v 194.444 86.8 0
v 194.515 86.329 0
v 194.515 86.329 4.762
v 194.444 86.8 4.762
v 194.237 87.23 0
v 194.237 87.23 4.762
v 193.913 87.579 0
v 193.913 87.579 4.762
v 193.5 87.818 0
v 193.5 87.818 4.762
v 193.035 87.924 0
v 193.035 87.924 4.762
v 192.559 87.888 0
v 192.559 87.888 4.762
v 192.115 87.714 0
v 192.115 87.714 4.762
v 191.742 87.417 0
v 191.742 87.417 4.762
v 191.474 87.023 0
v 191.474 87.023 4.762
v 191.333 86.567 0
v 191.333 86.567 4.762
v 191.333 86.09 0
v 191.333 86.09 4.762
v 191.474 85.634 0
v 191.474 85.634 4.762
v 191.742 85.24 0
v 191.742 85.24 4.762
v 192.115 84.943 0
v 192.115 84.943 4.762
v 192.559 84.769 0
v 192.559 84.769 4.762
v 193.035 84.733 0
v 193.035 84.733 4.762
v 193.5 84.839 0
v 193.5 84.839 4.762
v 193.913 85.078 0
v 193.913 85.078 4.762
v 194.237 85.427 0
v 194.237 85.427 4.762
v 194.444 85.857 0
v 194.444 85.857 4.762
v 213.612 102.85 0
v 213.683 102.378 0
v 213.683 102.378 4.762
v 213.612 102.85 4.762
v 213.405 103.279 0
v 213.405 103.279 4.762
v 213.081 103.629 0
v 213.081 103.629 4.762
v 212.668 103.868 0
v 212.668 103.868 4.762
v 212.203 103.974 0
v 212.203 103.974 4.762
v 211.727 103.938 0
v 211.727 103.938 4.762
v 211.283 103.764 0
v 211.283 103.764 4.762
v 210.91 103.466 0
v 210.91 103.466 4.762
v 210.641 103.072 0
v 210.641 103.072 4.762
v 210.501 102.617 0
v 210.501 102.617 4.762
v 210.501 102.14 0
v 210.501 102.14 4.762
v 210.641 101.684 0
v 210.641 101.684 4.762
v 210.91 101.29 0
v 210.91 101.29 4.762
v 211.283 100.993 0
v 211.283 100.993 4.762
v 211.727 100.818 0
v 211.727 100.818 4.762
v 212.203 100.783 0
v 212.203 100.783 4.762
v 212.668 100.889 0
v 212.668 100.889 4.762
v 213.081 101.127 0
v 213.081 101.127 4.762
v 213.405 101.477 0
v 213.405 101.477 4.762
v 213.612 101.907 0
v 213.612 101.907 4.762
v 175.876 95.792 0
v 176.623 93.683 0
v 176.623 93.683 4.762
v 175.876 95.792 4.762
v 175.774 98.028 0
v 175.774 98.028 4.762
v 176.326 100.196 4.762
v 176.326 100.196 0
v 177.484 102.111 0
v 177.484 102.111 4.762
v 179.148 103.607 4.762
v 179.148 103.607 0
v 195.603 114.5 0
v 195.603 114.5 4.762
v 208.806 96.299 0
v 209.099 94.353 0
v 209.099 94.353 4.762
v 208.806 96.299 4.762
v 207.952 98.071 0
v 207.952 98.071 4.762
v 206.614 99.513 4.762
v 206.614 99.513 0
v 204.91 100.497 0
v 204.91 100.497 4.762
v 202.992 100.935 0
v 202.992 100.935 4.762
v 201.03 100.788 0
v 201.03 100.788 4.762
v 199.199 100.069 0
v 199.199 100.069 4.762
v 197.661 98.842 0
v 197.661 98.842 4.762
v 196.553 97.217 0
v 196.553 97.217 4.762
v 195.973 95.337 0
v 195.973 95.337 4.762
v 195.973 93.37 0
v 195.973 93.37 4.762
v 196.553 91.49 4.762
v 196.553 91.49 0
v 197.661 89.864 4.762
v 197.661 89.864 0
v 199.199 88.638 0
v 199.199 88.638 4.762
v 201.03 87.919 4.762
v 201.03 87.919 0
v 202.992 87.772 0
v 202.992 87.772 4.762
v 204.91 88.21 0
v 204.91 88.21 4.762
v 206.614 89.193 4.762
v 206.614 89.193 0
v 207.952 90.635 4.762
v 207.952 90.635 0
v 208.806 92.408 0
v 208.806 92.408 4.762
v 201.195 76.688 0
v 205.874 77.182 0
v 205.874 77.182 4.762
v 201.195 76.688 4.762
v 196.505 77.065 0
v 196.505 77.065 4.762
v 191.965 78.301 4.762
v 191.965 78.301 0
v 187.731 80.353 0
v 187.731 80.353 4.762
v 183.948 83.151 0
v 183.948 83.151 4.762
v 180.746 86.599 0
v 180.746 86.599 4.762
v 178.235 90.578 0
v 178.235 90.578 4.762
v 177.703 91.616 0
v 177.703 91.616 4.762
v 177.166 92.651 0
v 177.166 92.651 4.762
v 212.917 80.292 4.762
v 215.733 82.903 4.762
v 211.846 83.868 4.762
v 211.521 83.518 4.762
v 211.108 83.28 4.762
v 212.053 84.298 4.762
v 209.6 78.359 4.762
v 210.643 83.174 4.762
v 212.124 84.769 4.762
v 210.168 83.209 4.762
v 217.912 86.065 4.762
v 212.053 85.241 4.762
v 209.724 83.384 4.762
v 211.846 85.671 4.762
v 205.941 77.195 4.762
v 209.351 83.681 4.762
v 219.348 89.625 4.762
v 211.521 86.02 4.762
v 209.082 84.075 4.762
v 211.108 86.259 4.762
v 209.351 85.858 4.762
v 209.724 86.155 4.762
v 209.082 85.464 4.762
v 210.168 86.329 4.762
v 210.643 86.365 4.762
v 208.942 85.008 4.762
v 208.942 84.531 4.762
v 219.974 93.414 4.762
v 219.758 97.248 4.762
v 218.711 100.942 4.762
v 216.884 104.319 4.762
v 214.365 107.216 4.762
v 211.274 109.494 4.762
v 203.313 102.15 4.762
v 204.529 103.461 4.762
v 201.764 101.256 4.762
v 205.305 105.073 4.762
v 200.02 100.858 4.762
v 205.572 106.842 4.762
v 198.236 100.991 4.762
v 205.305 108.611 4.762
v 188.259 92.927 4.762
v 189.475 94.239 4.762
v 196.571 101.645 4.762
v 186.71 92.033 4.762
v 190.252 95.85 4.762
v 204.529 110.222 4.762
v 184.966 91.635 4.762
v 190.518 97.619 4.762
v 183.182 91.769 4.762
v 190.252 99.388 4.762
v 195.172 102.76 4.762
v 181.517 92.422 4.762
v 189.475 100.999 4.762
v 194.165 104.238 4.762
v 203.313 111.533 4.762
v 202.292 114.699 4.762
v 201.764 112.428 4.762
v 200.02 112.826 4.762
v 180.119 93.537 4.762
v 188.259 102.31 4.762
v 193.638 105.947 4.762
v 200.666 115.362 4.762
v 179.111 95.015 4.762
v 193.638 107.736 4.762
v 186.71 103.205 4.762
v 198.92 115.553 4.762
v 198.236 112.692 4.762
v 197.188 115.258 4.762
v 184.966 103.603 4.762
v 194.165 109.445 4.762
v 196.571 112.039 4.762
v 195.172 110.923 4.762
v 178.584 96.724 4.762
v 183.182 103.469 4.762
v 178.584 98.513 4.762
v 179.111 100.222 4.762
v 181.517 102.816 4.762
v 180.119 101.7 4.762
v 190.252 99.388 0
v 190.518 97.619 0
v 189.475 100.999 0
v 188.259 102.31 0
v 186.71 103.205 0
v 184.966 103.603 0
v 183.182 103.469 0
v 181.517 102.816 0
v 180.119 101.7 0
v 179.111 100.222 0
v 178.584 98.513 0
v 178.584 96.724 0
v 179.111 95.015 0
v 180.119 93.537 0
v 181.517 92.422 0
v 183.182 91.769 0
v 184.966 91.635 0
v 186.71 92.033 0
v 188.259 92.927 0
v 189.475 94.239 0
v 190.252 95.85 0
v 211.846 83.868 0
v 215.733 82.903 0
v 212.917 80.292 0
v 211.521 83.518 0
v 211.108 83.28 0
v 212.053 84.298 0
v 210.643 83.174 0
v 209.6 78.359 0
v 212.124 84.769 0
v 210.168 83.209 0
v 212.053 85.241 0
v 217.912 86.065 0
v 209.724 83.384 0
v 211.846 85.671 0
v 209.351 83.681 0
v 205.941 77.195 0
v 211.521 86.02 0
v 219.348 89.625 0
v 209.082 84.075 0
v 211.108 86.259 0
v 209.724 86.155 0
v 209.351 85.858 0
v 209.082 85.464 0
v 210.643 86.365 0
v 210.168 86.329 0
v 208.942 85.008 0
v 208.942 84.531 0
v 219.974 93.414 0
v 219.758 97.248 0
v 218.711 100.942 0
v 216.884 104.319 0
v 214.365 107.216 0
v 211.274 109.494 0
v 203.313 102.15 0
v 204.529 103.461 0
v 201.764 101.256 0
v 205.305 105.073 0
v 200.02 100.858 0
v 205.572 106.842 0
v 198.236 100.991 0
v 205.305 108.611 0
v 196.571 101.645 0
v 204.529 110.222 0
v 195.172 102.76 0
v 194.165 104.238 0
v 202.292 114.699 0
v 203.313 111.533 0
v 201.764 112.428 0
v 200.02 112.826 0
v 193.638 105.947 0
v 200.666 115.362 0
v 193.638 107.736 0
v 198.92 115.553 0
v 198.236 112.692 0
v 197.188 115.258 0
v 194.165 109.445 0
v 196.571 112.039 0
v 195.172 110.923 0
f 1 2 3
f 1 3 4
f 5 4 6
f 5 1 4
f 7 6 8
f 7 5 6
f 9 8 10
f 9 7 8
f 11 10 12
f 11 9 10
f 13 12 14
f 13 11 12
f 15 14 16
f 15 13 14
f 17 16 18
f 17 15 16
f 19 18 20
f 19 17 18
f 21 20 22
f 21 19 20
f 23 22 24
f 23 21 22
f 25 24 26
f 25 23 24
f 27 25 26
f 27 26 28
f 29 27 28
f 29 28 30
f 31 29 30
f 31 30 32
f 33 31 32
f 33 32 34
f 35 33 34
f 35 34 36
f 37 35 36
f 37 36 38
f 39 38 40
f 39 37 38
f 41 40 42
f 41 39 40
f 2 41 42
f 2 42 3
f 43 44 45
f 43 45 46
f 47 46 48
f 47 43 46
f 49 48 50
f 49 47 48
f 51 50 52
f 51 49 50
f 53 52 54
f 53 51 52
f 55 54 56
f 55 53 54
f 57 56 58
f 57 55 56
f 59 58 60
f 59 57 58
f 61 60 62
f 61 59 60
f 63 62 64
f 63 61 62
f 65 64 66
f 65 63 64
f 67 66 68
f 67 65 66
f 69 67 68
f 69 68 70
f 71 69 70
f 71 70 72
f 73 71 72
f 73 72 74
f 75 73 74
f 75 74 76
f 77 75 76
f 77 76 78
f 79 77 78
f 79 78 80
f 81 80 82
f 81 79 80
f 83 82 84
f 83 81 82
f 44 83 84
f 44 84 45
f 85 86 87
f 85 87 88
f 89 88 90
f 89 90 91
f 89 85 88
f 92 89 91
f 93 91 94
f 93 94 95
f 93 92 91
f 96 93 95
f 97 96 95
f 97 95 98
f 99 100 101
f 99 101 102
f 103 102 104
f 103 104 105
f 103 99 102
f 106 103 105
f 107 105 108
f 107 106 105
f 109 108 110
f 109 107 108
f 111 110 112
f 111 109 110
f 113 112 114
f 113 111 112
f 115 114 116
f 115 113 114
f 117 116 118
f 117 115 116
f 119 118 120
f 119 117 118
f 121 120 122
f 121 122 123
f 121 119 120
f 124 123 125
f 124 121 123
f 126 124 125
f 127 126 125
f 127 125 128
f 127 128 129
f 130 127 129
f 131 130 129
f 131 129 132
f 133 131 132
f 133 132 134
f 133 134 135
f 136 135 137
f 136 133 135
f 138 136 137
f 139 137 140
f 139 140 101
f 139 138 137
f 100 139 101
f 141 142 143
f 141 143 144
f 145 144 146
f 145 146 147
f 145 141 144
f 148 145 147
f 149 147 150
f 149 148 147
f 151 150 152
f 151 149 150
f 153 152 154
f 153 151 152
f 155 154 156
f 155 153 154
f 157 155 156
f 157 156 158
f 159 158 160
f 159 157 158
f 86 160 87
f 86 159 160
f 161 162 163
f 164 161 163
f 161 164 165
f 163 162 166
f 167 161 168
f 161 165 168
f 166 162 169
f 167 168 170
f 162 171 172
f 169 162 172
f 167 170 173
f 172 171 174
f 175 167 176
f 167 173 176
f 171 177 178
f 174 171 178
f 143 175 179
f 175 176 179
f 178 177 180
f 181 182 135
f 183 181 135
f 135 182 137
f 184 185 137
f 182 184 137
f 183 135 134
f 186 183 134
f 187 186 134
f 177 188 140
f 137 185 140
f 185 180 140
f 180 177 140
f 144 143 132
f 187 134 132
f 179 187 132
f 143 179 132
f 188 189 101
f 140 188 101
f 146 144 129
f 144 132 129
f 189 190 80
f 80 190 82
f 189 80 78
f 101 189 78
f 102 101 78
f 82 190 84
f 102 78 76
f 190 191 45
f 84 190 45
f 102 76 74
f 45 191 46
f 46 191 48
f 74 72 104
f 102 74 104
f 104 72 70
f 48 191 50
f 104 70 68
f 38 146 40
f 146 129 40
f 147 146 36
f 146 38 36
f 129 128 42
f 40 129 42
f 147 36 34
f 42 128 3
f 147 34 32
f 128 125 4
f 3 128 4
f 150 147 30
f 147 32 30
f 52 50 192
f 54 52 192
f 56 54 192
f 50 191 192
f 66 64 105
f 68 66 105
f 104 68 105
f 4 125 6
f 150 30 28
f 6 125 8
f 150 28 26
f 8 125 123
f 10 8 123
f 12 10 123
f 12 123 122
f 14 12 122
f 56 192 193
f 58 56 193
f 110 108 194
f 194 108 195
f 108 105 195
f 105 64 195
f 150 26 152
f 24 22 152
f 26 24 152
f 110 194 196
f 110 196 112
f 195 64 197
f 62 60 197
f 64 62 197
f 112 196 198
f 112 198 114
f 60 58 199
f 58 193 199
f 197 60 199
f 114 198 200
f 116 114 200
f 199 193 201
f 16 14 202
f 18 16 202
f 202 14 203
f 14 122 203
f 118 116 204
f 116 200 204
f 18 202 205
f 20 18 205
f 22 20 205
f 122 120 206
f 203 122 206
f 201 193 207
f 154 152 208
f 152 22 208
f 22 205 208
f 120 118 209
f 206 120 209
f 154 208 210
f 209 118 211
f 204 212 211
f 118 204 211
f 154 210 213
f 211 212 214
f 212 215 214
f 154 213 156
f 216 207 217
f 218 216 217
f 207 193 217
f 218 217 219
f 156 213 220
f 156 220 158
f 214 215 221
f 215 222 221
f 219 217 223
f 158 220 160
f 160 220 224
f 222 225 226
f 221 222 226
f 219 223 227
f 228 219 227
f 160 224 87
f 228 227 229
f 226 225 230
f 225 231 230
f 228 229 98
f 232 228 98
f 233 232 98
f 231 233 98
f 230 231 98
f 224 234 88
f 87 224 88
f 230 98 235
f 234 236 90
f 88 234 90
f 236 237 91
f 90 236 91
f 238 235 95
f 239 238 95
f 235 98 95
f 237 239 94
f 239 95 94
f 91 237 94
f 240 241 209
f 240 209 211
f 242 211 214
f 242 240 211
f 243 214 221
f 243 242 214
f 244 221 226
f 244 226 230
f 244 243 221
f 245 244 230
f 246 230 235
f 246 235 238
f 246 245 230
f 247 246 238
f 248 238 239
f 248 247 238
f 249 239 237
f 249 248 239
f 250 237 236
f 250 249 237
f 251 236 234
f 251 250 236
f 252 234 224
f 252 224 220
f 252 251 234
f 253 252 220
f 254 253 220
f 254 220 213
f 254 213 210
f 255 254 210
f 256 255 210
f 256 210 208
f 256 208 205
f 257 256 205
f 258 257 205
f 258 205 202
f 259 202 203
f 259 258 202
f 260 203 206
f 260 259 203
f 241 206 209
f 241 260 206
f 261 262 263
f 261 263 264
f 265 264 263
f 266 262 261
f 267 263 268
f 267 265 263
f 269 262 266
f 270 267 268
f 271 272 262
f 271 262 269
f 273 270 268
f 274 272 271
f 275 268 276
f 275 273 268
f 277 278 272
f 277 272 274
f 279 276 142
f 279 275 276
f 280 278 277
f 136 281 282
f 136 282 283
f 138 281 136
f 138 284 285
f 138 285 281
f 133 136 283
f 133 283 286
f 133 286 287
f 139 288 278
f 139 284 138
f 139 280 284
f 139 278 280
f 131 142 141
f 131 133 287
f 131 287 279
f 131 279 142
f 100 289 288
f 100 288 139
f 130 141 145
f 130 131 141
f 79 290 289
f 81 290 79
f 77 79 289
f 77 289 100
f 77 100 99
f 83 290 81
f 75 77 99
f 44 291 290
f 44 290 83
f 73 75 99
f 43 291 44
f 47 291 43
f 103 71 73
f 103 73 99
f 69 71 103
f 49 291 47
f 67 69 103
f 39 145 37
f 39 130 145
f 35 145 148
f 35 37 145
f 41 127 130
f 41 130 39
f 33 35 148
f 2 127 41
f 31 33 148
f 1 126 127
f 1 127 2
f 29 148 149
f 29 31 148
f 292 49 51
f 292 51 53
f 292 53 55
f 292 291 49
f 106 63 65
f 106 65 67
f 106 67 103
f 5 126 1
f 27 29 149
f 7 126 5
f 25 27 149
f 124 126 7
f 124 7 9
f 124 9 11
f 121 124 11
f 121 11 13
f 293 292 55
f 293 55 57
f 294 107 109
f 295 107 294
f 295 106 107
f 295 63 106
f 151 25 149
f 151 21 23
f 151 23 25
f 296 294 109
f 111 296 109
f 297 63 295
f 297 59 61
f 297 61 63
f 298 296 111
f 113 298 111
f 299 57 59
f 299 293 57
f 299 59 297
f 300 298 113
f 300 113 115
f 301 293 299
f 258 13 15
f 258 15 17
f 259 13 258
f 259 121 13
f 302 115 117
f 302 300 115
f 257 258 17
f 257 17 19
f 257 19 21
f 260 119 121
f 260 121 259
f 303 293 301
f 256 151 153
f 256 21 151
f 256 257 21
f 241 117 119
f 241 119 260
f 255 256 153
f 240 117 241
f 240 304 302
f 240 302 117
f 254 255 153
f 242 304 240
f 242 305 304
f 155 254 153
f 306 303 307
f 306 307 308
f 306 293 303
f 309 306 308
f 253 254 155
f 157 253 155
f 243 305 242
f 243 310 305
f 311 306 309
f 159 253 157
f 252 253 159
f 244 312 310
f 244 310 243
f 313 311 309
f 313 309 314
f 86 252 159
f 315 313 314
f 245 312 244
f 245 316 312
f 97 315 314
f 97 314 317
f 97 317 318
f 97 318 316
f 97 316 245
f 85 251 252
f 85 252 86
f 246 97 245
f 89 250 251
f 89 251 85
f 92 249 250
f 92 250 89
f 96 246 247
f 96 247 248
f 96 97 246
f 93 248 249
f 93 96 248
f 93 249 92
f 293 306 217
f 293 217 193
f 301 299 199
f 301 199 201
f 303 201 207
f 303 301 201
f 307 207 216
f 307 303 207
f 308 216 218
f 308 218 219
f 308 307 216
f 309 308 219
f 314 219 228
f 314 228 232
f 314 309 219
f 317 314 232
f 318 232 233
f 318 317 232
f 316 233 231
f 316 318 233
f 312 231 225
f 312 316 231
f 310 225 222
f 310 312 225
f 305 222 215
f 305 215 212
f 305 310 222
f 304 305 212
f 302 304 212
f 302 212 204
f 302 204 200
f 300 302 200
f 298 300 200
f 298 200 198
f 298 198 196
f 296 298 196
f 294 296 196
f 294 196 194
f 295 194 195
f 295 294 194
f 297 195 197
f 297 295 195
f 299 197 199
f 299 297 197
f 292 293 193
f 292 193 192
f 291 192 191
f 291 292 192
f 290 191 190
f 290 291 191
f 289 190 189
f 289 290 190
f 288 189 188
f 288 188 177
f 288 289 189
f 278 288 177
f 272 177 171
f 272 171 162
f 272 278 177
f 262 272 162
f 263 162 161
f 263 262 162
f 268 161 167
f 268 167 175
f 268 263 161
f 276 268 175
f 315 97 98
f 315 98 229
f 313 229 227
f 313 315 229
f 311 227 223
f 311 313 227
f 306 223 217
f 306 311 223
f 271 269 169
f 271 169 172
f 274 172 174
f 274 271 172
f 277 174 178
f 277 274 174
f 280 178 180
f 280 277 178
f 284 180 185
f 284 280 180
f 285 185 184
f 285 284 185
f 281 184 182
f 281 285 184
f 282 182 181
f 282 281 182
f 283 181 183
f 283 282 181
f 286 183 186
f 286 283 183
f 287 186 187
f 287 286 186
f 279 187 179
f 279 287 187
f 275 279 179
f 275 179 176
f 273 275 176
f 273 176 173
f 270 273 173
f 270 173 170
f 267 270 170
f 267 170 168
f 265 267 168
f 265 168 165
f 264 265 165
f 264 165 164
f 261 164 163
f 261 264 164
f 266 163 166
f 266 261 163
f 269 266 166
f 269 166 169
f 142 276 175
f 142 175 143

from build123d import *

# Parameters (mm, degrees)
SKETCH1_R           = 6.00075
SKETCH1_R_2         = 1.6
SKETCH1_R_3         = 6.6
BOSS_EXTRUDE1_DEPTH = 4.7625


with BuildPart() as part:
    # Sketch1 → Boss-Extrude1 (new body)
    with BuildSketch(Plane.XY):
        with BuildLine():
            Line((179.148086511, 103.607144631), (195.603327806, 114.500302414))
            ThreePointArc((195.603327806, 114.500302414), (198.919543637, 115.552562907), (202.292483355, 114.699440851))
            Line((202.292483355, 114.699440851), (211.27381454, 109.494480567))
            ThreePointArc((211.27381454, 109.494480567), (219.765287832, 91.502488859), (205.940797496, 77.195135812))
            Line((205.940797496, 77.195135812), (205.873802068, 77.181697321))
            ThreePointArc((205.873802068, 77.181697321), (189.799923624, 79.228940232), (178.234639917, 90.578168601))
            ThreePointArc((178.234639917, 90.578168601), (177.435417915, 92.133945768), (176.622616151, 93.682671597))
            ThreePointArc((176.622616151, 93.682671597), (175.969639562, 99.132397301), (179.148086511, 103.607144631))
        make_face()
        with Locations((184.517388009, 97.618855822)):
            Circle(SKETCH1_R, mode=Mode.SUBTRACT)
        with Locations((199.571302743, 106.841754978)):
            Circle(SKETCH1_R, mode=Mode.SUBTRACT)
        with Locations((212.083037321, 102.378153756)):
            Circle(SKETCH1_R_2, mode=Mode.SUBTRACT)
        with Locations((210.523861298, 84.769378384)):
            Circle(SKETCH1_R_2, mode=Mode.SUBTRACT)
        with Locations((192.915085926, 86.328554406)):
            Circle(SKETCH1_R_2, mode=Mode.SUBTRACT)
        with Locations((202.499061623, 94.353354081)):
            Circle(SKETCH1_R_3, mode=Mode.SUBTRACT)
    extrude(amount=BOSS_EXTRUDE1_DEPTH)


solid = part.part
